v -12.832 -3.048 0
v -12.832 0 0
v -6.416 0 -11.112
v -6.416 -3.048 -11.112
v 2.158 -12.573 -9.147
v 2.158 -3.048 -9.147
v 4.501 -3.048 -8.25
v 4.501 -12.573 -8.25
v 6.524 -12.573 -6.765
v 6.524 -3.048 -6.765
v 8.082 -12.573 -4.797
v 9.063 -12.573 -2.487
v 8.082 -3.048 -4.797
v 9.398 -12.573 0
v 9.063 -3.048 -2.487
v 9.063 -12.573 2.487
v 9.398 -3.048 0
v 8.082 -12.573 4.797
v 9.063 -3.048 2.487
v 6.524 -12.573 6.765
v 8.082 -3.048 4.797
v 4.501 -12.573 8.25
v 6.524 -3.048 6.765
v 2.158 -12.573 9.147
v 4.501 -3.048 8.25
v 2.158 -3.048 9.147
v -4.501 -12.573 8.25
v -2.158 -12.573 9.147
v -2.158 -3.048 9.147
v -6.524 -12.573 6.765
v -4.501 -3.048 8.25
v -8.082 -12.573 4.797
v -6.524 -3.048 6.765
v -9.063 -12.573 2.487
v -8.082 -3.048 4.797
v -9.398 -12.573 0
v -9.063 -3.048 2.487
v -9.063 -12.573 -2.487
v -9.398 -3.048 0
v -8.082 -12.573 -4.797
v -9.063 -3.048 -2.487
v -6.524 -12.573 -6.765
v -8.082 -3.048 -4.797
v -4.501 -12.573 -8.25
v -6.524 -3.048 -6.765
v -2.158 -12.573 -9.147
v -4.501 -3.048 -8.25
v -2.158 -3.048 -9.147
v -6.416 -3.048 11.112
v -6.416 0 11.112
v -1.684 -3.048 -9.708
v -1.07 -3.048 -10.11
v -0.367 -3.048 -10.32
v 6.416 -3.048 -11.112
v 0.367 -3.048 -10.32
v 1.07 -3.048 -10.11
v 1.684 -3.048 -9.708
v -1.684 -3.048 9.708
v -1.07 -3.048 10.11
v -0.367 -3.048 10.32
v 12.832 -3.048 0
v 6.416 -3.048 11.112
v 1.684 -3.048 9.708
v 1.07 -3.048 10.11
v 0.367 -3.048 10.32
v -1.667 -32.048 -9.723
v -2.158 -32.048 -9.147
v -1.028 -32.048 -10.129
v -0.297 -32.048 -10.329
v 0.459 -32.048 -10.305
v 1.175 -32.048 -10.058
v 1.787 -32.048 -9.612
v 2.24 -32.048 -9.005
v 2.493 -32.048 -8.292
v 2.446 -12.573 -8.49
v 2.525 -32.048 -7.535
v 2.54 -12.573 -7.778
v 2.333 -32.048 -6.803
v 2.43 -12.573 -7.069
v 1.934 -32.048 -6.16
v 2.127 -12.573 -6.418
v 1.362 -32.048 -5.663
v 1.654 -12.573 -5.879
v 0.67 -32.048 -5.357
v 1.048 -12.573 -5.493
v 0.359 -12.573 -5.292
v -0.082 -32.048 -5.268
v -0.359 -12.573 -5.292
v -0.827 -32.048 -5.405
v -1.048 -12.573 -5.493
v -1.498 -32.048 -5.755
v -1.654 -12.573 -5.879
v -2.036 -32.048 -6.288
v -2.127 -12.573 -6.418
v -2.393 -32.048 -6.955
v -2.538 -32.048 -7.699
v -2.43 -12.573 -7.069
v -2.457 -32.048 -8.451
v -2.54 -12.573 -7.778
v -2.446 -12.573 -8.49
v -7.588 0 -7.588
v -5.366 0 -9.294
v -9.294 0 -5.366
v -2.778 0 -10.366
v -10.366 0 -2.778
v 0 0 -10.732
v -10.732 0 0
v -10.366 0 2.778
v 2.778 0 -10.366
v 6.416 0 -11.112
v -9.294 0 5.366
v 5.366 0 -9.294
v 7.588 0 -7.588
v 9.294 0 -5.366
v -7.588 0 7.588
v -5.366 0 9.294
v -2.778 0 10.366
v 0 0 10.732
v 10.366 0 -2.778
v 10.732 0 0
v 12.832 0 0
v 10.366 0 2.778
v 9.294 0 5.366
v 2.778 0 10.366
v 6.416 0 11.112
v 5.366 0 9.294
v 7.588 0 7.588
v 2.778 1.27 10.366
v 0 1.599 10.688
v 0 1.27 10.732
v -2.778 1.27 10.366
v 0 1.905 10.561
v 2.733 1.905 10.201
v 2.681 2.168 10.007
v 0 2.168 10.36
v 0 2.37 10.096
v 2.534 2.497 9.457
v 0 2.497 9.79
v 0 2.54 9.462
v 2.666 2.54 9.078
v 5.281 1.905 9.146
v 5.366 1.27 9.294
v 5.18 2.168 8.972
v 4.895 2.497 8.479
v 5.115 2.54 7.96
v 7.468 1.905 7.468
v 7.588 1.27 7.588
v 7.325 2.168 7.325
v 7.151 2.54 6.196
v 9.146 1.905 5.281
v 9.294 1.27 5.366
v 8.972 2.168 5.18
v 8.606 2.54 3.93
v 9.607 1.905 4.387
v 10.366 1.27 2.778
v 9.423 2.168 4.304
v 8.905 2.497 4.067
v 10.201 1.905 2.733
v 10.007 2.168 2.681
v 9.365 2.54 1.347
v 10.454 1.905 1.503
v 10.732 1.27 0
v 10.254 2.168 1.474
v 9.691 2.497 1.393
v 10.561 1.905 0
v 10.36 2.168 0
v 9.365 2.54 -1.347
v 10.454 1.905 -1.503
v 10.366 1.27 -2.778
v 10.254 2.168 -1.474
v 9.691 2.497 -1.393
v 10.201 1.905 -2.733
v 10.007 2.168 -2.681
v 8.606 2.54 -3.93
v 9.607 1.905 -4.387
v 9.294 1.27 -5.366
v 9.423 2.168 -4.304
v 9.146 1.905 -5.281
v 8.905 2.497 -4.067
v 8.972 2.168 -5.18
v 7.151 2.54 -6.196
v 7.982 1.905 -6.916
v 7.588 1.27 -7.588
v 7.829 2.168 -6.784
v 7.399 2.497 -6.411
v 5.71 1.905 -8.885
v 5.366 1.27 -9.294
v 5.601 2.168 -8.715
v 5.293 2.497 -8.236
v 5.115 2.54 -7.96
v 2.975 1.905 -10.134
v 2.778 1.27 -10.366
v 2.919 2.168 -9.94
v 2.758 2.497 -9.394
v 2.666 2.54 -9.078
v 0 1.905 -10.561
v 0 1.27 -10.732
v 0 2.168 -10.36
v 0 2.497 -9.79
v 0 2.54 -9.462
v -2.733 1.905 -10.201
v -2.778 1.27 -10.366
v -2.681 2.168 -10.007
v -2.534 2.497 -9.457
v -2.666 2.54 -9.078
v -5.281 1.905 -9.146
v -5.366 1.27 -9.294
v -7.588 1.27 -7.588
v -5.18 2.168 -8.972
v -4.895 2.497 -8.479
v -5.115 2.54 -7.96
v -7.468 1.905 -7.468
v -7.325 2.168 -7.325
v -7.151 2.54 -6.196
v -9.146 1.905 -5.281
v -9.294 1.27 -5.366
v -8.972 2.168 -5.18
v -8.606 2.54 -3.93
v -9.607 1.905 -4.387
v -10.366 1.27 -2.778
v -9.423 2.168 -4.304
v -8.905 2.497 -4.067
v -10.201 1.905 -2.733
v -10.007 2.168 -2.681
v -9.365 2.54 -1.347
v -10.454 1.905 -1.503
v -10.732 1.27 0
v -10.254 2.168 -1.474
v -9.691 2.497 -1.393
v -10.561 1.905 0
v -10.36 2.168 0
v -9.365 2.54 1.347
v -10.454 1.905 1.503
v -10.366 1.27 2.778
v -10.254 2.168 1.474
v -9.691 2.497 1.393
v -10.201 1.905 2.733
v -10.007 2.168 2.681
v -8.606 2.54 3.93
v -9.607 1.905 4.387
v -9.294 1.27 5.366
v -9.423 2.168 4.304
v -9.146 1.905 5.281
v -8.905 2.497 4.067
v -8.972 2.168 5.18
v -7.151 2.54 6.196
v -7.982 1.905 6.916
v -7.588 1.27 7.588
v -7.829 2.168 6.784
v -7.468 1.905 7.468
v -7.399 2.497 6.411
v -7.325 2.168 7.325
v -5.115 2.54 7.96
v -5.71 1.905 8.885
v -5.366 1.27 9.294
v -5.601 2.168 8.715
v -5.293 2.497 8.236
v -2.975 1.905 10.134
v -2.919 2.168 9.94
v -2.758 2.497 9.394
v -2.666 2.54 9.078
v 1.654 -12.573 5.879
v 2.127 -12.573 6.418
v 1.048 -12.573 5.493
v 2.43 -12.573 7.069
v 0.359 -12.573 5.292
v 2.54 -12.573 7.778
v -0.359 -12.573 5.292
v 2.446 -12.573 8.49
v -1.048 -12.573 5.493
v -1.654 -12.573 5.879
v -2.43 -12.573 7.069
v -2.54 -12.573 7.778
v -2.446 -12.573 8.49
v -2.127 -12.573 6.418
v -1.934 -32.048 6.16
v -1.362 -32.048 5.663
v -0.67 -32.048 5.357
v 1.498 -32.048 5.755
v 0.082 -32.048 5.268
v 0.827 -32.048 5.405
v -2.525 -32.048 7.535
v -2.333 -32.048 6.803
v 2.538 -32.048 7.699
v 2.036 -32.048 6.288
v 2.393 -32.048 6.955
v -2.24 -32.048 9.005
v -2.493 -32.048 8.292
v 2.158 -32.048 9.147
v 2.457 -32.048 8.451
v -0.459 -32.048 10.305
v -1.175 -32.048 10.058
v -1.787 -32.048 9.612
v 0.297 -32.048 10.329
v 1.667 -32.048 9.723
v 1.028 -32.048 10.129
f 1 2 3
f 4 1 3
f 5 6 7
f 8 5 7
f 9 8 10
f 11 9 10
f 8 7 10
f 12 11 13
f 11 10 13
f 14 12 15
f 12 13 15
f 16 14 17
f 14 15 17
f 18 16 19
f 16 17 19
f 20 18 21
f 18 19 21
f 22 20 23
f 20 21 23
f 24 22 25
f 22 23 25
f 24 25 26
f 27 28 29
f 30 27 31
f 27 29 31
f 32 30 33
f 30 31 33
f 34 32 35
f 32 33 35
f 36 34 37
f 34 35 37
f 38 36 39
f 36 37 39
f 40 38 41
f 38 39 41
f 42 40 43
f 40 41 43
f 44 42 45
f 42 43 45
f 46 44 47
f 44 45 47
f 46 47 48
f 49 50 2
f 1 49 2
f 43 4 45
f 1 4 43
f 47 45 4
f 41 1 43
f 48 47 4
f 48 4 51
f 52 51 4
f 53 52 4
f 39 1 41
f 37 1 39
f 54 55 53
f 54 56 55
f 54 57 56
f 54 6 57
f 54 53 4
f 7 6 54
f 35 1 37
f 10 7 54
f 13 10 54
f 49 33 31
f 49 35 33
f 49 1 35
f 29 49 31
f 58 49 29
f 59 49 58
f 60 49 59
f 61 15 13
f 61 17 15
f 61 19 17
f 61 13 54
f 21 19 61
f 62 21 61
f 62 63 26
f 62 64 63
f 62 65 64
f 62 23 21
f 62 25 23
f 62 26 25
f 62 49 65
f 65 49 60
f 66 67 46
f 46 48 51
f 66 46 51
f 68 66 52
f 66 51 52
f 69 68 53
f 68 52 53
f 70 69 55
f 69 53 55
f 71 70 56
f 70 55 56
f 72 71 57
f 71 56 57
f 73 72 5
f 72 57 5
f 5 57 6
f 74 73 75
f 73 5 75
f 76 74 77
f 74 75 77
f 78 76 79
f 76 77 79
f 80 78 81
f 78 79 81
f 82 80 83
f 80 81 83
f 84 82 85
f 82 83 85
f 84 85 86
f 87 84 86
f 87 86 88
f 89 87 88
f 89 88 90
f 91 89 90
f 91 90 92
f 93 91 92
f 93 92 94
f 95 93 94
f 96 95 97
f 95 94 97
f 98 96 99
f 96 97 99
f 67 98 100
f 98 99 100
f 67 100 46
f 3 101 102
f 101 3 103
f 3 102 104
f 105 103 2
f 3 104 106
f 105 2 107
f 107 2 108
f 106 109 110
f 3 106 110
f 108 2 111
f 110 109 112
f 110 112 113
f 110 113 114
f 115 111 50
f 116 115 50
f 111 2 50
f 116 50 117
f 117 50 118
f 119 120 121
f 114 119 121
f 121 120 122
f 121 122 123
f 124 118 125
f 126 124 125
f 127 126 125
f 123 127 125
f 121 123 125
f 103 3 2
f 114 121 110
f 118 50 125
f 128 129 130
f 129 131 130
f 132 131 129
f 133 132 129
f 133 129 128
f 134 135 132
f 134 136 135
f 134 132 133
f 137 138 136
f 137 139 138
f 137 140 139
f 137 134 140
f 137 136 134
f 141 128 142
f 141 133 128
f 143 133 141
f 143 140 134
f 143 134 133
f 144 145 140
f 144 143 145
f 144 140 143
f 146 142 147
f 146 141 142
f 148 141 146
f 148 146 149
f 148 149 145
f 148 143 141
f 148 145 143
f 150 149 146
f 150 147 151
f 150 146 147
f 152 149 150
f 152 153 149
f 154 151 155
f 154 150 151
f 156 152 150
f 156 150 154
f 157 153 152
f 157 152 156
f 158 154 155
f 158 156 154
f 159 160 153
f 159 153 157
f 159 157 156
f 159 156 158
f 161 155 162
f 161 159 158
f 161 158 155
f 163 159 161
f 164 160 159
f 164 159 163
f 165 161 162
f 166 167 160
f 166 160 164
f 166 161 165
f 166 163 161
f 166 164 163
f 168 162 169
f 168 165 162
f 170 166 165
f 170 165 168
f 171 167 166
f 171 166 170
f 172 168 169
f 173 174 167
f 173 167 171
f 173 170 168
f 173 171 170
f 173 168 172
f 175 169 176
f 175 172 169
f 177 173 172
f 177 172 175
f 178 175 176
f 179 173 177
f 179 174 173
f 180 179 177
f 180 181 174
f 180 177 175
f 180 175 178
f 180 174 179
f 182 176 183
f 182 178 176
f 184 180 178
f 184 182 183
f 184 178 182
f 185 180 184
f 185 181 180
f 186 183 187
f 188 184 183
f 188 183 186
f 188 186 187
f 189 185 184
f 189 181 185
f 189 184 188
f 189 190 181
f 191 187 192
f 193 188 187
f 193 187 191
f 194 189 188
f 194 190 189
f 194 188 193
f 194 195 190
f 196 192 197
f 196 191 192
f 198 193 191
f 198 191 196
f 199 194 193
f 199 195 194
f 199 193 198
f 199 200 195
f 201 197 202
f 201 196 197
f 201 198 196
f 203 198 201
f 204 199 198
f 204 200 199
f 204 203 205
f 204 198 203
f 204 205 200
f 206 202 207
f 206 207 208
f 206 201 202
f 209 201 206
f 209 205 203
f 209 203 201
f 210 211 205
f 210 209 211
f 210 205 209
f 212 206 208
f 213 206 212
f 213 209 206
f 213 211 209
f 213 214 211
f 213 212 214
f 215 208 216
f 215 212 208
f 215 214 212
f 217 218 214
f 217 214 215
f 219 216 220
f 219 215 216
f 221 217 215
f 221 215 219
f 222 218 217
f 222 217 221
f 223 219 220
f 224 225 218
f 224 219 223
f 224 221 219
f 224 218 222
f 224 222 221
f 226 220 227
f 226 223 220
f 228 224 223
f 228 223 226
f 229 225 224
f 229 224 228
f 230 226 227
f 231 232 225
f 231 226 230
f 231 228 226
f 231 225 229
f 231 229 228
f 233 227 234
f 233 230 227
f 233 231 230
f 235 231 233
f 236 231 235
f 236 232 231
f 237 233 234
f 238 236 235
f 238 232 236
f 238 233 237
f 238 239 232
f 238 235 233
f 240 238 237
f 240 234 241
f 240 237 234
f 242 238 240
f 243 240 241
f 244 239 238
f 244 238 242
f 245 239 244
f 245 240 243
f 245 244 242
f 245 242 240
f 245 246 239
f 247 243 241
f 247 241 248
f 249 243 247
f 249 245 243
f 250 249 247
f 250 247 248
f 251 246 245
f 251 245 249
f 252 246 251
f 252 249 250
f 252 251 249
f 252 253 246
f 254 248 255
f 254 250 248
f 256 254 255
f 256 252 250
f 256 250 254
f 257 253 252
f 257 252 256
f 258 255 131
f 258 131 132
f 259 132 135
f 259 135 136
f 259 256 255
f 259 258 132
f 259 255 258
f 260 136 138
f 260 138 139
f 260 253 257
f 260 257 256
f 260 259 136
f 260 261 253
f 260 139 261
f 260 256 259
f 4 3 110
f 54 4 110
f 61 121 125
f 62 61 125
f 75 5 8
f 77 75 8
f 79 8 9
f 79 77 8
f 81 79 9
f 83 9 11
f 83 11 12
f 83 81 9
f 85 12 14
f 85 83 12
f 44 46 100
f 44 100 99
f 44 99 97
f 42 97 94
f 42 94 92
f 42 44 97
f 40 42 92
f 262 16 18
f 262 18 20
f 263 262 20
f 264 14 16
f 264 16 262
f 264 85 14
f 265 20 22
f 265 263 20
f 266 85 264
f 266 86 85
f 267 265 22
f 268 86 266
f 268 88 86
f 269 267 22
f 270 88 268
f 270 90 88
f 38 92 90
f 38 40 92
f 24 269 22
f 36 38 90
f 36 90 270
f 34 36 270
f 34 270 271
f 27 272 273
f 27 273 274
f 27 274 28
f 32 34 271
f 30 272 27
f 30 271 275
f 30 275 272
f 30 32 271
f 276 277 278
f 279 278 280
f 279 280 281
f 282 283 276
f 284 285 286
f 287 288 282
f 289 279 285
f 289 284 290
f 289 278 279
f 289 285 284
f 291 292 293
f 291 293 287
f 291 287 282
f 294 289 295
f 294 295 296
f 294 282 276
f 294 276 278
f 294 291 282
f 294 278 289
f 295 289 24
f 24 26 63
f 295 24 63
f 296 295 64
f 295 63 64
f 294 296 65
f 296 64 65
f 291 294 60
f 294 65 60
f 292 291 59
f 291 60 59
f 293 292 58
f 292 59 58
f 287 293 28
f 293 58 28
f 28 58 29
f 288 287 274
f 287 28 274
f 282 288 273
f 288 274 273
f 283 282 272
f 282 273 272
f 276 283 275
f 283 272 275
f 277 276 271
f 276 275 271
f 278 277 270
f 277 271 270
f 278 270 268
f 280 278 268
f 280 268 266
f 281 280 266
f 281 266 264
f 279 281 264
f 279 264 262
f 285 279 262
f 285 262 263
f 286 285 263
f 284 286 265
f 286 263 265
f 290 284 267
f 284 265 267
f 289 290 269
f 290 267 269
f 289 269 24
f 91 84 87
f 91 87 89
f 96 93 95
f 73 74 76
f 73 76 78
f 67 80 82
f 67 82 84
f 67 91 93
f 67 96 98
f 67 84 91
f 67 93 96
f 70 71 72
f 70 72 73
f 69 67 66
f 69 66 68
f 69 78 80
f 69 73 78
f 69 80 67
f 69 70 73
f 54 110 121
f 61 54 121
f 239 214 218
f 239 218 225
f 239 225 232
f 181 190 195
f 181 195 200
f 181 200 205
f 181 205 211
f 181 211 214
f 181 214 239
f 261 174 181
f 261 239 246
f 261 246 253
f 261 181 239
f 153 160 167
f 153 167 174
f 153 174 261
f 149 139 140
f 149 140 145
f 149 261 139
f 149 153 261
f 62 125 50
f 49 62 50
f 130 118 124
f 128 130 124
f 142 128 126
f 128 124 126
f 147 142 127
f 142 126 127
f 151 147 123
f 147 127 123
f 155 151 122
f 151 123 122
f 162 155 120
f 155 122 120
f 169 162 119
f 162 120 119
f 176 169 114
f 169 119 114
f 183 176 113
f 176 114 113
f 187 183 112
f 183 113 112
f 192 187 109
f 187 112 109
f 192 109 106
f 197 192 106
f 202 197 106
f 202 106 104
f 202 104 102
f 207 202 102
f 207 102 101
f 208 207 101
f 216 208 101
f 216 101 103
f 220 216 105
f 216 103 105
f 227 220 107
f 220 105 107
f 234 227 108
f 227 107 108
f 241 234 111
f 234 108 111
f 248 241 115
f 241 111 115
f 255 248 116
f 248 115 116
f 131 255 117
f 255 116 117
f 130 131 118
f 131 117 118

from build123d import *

# Parameters (mm, degrees)
SKETCH1_R           = 10.7315
BOSS_EXTRUDE1_DEPTH = 2.54
BOSS_EXTRUDE2_DEPTH = 3.048
SKETCH4_R           = 9.398
BOSS_EXTRUDE4_DEPTH = 9.525
SKETCH3_R           = 2.54
BOSS_EXTRUDE3_DEPTH = 29
FILLET1_R           = 1.27


with BuildPart() as part:
    # Sketch1 → Boss-Extrude1 (new body)
    with BuildSketch(Plane(origin=(0, 0, 0), x_dir=(1, 0, 0), z_dir=(0, 1, 0))):
        with Locations(Location((0, 0, 0), (0, 0, 270))):
            Circle(SKETCH1_R)
    extrude(amount=BOSS_EXTRUDE1_DEPTH)

    # Sketch2 → Boss-Extrude2 (add)
    with BuildSketch(Plane.XZ):
        Polygon((-12.831609733, 0), (-6.415804866, -11.1125), (6.415804866, -11.1125), (12.831609733, 0), (6.415804866, 11.1125), (-6.415804866, 11.1125), align=None)
    extrude(amount=BOSS_EXTRUDE2_DEPTH)

    # Sketch4 → Boss-Extrude4 (add)
    with BuildSketch(Plane.XZ.offset(3.048)):
        with Locations(Location((0, 0, 0), (0, 0, 90))):
            Circle(SKETCH4_R)
    extrude(amount=BOSS_EXTRUDE4_DEPTH)

    # Sketch3 → Boss-Extrude3 (add)
    with BuildSketch(Plane.XZ.offset(3.048)):
        with Locations(Location((0, 7.80660503, 0), (0, 0, 31.85091732))):
            Circle(SKETCH3_R)
        with Locations(Location((0, -7.80660503, 0), (0, 0, 211.85091732))):
            Circle(SKETCH3_R)
    extrude(amount=BOSS_EXTRUDE3_DEPTH)

    # Fillet1
    fillet1_edges = [part.edges().sort_by_distance(p)[0] for p in [
        (0, 2.54, -10.7315),
    ]]
    fillet(fillet1_edges, radius=FILLET1_R)


solid = part.part
